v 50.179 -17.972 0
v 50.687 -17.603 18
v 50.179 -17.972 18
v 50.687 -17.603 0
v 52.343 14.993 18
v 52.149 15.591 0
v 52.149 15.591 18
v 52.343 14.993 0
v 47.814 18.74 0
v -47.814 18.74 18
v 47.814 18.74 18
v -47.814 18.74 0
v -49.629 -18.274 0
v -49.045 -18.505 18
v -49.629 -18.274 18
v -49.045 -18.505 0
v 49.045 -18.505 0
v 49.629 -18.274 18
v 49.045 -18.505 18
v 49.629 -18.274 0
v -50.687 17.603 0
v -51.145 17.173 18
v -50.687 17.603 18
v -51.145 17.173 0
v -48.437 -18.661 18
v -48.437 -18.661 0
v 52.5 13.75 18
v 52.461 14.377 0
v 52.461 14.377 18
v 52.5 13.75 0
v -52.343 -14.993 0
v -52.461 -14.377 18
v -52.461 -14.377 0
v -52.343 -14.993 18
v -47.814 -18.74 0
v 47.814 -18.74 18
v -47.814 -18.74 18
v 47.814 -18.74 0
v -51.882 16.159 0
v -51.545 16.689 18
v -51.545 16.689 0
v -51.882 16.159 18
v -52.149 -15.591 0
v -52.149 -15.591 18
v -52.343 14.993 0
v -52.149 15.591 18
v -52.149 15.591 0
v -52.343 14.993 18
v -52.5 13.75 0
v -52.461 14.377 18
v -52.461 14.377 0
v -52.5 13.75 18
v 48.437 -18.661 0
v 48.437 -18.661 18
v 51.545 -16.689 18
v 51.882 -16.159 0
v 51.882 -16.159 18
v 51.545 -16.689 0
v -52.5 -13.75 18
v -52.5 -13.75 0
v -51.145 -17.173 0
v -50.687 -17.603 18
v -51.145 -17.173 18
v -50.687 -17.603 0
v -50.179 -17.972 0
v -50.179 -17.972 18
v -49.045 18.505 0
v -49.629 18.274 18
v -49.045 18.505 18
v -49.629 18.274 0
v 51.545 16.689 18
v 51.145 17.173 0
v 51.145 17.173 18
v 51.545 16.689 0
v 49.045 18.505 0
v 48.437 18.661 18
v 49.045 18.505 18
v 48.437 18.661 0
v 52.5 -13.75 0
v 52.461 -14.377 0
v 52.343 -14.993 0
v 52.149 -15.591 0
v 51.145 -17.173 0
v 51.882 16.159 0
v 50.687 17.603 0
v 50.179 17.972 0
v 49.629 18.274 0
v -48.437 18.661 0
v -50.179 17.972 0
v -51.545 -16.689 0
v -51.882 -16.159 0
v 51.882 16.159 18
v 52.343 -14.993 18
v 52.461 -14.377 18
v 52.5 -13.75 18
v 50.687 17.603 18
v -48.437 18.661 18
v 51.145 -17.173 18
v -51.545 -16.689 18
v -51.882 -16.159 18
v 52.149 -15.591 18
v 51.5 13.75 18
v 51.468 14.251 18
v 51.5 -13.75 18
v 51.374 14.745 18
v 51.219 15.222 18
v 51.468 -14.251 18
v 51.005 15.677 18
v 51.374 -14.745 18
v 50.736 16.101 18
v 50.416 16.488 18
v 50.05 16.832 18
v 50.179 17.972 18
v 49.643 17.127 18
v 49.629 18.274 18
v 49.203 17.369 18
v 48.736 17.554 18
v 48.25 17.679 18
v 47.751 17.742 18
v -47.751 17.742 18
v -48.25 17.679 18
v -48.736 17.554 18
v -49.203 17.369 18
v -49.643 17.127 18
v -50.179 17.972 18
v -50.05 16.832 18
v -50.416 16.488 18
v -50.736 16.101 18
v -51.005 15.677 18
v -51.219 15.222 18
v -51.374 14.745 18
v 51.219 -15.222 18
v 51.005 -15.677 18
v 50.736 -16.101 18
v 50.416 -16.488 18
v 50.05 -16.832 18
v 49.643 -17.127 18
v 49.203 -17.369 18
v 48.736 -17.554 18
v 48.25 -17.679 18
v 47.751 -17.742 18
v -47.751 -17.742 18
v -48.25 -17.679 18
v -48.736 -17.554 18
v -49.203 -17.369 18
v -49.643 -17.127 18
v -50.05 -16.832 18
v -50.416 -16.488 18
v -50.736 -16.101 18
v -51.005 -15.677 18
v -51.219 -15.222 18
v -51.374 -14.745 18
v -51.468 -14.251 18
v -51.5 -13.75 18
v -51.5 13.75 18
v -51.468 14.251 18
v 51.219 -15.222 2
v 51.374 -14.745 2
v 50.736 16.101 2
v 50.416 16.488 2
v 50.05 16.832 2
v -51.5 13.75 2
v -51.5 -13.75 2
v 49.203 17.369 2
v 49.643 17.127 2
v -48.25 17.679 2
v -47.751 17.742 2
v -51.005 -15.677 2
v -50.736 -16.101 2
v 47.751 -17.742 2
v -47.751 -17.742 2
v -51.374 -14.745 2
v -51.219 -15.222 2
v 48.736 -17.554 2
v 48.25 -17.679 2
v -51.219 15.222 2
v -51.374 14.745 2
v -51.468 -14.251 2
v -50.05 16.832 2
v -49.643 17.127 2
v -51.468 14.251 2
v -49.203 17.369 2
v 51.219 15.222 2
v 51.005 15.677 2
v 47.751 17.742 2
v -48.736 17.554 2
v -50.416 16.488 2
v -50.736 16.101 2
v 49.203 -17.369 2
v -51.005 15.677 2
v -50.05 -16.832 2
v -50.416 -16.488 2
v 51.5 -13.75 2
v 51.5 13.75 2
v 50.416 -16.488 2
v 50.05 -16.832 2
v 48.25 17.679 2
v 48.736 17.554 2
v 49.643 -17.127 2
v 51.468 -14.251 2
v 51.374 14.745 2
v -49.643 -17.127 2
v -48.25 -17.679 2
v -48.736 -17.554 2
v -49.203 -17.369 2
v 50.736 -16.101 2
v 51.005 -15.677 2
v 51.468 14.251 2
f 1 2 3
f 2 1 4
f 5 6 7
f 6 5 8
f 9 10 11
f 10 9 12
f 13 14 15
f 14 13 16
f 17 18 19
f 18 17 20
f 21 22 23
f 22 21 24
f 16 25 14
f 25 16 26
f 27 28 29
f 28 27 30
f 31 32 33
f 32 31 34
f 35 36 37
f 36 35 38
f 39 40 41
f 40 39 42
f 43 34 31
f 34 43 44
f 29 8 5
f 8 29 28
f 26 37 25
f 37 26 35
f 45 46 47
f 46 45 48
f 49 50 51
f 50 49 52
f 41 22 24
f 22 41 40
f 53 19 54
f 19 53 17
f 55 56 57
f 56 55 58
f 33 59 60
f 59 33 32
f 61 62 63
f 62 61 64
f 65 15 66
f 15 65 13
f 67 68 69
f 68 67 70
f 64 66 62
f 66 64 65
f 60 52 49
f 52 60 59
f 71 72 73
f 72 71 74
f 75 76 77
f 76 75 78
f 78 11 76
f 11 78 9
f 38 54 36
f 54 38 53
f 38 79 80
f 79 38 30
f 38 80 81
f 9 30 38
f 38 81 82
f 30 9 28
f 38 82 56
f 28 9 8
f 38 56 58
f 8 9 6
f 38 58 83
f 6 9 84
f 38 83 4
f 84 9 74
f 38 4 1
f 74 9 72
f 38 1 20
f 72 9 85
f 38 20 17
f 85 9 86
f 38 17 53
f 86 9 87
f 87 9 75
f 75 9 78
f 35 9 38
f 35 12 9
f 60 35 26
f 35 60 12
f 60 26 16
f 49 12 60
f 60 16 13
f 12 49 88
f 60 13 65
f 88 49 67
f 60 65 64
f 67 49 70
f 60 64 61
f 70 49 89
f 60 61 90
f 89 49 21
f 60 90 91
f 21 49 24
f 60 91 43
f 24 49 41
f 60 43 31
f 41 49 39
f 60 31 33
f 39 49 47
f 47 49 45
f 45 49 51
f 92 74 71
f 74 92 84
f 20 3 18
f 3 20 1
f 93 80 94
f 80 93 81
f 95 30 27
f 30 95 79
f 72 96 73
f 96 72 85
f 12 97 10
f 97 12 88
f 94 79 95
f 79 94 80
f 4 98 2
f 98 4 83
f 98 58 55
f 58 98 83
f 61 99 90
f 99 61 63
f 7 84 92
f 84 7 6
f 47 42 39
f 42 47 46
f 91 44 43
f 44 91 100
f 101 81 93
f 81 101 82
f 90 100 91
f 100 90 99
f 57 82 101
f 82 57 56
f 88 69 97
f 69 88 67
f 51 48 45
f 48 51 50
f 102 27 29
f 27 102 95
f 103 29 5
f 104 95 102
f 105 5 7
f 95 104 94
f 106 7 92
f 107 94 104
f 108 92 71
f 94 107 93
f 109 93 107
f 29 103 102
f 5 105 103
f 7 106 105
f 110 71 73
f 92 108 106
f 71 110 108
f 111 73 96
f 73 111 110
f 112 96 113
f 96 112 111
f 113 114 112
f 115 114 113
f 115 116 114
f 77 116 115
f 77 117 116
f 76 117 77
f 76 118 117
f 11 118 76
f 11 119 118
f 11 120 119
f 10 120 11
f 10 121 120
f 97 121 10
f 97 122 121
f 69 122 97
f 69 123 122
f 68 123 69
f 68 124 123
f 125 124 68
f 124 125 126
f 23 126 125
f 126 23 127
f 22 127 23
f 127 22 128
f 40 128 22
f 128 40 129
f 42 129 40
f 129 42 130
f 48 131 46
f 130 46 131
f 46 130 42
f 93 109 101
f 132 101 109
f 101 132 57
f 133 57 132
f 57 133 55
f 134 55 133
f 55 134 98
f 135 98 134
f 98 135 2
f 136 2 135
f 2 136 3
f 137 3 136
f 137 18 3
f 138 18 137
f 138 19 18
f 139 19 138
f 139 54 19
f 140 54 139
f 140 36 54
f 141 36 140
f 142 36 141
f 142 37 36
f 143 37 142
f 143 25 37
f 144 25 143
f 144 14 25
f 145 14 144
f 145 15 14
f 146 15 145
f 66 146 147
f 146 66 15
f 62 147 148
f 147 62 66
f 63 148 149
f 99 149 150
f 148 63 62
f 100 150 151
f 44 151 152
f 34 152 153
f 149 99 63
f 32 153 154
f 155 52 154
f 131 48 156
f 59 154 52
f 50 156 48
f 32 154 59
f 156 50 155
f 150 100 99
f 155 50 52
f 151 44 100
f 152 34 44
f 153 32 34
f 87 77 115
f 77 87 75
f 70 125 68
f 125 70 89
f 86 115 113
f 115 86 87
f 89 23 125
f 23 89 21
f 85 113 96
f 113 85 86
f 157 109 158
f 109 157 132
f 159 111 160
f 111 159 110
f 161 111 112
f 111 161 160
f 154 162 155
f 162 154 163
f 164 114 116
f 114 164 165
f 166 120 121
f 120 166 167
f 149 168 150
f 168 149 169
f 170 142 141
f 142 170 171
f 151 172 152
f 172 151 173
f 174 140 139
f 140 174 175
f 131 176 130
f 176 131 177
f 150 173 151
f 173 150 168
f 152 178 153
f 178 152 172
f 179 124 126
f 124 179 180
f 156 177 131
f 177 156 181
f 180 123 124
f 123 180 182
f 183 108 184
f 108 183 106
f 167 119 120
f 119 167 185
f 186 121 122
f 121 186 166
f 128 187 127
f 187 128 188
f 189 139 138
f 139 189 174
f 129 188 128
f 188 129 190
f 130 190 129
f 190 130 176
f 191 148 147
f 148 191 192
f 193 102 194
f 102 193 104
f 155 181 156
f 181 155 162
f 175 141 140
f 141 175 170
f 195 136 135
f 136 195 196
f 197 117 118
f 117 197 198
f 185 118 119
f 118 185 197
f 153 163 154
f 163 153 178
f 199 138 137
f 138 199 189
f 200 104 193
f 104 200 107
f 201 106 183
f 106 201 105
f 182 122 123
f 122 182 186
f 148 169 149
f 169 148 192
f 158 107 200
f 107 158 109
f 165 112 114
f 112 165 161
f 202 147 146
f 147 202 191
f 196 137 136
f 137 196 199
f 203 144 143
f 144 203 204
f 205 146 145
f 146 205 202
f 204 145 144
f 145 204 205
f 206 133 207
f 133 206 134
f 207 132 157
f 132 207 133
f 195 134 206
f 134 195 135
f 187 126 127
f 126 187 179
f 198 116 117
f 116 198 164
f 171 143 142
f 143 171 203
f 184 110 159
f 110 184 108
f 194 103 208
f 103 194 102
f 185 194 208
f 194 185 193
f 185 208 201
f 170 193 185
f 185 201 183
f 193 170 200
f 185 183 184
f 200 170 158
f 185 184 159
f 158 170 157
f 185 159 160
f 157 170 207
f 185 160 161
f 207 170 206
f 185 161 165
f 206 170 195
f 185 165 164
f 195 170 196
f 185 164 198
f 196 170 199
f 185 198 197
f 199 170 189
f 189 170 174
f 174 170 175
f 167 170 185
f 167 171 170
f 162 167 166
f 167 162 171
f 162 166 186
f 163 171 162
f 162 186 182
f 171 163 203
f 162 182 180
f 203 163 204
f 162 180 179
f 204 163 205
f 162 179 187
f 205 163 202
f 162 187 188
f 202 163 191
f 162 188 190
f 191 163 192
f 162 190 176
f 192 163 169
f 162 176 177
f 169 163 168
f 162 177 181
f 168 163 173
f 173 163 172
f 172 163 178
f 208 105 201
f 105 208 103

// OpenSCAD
$fn = 50;


difference() {
	union() {
		hull() {
			translate(v = [-47.5000000000, 13.7500000000, 0]) {
				cylinder(h = 18, r = 5);
			}
			translate(v = [47.5000000000, 13.7500000000, 0]) {
				cylinder(h = 18, r = 5);
			}
			translate(v = [-47.5000000000, -13.7500000000, 0]) {
				cylinder(h = 18, r = 5);
			}
			translate(v = [47.5000000000, -13.7500000000, 0]) {
				cylinder(h = 18, r = 5);
			}
		}
	}
	union() {
		translate(v = [0, 0, 2]) {
			hull() {
				translate(v = [-47.5000000000, 13.7500000000, 0]) {
					cylinder(h = 16, r = 4);
				}
				translate(v = [47.5000000000, 13.7500000000, 0]) {
					cylinder(h = 16, r = 4);
				}
				translate(v = [-47.5000000000, -13.7500000000, 0]) {
					cylinder(h = 16, r = 4);
				}
				translate(v = [47.5000000000, -13.7500000000, 0]) {
					cylinder(h = 16, r = 4);
				}
			}
		}
	}
}
